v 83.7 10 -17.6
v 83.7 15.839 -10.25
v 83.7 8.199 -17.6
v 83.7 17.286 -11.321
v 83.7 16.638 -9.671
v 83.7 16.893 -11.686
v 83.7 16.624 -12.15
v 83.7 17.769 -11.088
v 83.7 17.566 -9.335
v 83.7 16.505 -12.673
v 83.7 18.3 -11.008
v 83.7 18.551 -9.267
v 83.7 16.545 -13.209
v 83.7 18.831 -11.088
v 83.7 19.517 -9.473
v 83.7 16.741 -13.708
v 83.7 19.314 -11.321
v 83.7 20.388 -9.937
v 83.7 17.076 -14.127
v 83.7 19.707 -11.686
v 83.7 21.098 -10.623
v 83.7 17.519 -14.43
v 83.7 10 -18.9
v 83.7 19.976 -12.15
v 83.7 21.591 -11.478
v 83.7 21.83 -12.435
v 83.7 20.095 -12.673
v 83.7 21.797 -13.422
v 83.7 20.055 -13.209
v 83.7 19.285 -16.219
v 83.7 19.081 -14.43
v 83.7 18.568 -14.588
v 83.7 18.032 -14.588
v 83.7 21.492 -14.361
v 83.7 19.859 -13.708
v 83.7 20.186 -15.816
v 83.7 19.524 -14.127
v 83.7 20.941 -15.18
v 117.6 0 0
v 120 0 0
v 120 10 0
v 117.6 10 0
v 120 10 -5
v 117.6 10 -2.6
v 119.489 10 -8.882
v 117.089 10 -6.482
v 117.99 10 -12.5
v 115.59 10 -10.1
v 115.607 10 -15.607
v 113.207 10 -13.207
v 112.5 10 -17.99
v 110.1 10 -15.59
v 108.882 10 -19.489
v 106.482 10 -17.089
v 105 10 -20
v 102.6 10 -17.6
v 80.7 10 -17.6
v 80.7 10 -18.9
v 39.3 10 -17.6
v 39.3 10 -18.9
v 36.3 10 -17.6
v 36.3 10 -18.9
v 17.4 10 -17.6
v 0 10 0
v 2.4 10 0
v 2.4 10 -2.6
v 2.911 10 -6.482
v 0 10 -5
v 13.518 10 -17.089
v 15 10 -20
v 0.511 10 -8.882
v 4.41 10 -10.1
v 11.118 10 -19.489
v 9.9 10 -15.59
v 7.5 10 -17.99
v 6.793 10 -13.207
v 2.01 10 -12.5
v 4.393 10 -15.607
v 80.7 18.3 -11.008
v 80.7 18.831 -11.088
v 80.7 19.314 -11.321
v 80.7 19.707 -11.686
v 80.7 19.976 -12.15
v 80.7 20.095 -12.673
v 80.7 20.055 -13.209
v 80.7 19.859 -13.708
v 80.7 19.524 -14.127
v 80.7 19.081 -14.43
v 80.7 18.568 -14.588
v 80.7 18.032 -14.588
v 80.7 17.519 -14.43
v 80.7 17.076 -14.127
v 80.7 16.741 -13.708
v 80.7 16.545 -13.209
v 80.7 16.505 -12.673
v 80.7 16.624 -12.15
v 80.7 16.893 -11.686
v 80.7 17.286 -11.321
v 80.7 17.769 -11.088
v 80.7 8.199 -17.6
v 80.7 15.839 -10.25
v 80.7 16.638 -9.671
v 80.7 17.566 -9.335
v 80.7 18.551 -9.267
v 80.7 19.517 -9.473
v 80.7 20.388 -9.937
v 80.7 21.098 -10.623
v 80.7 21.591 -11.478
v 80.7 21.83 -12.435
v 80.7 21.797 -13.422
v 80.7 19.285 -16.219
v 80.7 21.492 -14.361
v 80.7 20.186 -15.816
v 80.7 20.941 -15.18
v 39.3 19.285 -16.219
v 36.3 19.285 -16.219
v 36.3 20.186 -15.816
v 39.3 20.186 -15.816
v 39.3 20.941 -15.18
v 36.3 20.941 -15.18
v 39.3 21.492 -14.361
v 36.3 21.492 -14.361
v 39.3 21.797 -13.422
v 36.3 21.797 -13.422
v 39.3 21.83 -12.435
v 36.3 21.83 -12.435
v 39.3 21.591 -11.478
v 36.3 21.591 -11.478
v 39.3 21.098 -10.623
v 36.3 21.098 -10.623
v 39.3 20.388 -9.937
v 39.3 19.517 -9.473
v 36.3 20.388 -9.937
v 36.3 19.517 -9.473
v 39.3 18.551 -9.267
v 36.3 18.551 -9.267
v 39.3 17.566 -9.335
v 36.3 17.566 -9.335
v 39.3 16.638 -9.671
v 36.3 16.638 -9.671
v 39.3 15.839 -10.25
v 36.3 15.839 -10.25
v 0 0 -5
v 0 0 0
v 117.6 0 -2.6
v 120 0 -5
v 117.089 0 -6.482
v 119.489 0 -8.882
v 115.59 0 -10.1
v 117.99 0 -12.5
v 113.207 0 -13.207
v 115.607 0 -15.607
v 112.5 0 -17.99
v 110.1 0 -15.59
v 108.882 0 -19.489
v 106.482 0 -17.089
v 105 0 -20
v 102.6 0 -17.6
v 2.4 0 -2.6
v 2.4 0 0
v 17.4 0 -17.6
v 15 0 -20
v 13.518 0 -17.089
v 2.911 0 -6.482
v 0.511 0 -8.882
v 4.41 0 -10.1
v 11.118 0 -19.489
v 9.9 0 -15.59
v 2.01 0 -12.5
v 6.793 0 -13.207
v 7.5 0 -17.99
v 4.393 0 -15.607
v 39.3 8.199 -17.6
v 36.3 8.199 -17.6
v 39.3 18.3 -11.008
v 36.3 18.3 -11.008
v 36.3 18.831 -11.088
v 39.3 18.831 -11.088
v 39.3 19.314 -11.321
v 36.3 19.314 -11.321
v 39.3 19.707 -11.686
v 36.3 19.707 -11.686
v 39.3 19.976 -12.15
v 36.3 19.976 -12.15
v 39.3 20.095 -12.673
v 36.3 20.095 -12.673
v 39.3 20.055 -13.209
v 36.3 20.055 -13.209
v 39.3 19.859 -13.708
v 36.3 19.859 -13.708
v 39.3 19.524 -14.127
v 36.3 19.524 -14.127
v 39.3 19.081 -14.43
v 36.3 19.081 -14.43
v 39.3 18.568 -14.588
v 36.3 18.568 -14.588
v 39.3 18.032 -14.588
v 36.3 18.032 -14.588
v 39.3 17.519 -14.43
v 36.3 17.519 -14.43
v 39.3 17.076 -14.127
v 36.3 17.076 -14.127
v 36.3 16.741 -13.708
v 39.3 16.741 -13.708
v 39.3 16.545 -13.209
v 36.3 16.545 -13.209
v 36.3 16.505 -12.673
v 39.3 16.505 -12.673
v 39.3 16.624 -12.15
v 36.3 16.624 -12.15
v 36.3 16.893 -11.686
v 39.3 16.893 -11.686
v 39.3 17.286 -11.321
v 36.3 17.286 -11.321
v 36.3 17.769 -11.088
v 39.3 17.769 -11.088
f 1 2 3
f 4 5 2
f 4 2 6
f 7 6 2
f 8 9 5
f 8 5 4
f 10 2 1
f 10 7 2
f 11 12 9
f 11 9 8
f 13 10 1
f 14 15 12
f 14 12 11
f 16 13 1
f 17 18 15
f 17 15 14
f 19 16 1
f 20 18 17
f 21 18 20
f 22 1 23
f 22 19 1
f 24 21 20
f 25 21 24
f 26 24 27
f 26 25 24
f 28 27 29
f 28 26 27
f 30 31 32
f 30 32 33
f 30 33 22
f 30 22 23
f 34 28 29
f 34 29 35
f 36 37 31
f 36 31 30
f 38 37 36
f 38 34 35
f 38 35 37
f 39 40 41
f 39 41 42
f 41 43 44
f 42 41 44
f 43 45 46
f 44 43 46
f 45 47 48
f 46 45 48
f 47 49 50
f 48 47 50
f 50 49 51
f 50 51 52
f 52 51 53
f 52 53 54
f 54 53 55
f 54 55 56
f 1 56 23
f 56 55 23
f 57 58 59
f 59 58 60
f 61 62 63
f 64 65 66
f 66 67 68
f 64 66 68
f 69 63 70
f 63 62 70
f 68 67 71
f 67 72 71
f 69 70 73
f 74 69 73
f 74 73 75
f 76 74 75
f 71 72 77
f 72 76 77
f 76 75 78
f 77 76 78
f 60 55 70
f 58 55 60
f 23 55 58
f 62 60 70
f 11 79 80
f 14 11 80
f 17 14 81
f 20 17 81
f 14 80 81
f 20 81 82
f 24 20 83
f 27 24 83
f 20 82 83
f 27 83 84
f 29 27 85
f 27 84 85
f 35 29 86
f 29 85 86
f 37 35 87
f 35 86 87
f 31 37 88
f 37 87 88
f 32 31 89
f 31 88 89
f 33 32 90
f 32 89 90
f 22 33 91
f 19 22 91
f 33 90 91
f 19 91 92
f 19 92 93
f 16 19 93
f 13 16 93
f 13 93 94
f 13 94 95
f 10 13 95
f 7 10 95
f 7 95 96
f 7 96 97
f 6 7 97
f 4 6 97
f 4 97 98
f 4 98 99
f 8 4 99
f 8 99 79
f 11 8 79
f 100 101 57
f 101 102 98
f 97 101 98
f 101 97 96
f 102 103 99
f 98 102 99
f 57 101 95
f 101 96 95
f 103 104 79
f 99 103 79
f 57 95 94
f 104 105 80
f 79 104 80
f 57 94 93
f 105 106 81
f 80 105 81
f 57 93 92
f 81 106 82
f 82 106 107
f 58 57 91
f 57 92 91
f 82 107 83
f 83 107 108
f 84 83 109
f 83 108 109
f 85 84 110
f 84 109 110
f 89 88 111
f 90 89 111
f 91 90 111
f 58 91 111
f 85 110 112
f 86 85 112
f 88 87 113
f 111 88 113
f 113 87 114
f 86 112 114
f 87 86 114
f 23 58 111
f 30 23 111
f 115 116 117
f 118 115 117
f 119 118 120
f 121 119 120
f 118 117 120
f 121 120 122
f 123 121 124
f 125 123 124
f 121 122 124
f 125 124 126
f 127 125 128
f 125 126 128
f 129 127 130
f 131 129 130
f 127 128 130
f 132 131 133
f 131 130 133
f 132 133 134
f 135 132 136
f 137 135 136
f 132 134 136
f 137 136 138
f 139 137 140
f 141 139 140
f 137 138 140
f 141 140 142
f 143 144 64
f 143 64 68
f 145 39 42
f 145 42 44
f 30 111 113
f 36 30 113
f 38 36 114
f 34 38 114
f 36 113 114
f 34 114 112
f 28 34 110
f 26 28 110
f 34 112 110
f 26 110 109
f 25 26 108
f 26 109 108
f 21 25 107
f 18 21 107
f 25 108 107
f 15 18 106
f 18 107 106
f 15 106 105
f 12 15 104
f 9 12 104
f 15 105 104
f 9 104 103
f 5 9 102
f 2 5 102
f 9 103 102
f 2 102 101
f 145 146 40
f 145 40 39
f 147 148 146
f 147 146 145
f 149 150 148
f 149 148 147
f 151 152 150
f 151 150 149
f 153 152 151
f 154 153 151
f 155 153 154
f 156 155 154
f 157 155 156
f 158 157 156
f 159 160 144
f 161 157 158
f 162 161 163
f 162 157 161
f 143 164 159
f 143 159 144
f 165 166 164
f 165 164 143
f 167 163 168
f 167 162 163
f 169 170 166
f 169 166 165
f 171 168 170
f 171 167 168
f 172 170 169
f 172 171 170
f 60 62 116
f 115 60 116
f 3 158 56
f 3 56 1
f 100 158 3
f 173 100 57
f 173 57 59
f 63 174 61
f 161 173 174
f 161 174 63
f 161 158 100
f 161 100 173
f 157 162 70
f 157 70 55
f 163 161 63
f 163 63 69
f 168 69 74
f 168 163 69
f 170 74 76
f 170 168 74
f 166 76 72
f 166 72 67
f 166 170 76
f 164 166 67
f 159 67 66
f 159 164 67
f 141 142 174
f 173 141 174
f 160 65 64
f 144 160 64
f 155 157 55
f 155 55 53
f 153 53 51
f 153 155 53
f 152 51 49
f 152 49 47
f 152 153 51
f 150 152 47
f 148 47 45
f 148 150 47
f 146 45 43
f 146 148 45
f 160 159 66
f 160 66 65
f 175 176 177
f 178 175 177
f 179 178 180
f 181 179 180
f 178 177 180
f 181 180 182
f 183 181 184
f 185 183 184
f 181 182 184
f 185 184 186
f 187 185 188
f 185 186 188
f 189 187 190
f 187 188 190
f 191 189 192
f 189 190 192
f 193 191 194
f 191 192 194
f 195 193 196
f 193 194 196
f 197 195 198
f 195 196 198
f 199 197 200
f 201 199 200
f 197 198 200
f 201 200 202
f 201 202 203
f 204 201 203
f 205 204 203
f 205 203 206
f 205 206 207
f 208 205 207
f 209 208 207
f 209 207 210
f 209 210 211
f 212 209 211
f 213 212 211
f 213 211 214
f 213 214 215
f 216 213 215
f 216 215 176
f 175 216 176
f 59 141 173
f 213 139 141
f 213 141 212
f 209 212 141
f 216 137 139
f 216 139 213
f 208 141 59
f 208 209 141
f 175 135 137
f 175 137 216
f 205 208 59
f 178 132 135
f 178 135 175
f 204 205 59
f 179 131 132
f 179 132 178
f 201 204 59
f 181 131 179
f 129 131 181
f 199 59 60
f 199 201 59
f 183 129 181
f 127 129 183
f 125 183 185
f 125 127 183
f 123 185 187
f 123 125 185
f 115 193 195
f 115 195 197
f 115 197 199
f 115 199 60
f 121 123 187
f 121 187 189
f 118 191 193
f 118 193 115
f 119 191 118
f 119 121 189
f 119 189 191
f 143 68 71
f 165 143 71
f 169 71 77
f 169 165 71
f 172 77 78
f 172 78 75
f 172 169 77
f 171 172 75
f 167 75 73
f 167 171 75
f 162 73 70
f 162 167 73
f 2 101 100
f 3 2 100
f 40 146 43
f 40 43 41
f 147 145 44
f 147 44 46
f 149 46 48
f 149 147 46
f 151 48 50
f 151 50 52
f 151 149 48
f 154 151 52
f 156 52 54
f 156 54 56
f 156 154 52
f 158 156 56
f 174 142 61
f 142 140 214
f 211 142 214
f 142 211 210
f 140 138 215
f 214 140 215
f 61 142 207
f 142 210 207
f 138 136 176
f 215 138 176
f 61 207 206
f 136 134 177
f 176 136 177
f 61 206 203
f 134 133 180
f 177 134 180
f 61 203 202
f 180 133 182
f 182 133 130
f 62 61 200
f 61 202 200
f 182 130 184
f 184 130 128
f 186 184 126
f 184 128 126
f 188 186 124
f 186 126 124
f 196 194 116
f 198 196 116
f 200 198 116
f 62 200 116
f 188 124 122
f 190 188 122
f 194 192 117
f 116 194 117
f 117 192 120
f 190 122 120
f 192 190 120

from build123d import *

# Parameters (mm, degrees)
BOSS_EXTRUDE1_DEPTH  = 10
SKETCH2_R            = 3.55
SKETCH2_R_2          = 1.75
BOSS_EXTRUDE2_DEPTH  = 3
BOSS_EXTRUDE3_START  = -44.4
SKETCH2_3_R          = 3.55
SKETCH2_3_R_2        = 1.75
BOSS_EXTRUDE3_DEPTH  = 3
M3_CLEARANCE_HOLE1_D = 3.6


with BuildPart() as part:
    # Sketch1 → Boss-Extrude1 (new body)
    with BuildSketch(Plane(origin=(0, 0, 0), x_dir=(1, 0, 0), z_dir=(0, 1, 0))):
        with BuildLine():
            Line((0, 0), (0, 5))
            ThreePointArc((0, 5), (4.393398282, 15.606601718), (15, 20))
            Line((15, 20), (105, 20))
            ThreePointArc((105, 20), (115.606601718, 15.606601718), (120, 5))
            Line((120, 5), (120, 0))
            Line((120, 0), (117.6, 0))
            Line((117.6, 0), (117.6, 2.6))
            ThreePointArc((117.6, 2.6), (113.206601718, 13.206601718), (102.6, 17.6))
            Line((102.6, 17.6), (17.4, 17.6))
            ThreePointArc((17.4, 17.6), (6.793398282, 13.206601718), (2.4, 2.6))
            Line((2.4, 2.6), (2.4, 0))
            Line((2.4, 0), (0, 0))
        make_face()
    extrude(amount=BOSS_EXTRUDE1_DEPTH)

    # Sketch2 → Boss-Extrude2 (add)
    # profile 1 of 3: a face of its own
    with BuildSketch(Plane(origin=(80.7, 0, 0), x_dir=(0, 0, -1), z_dir=(1, 0, 0))):
        with BuildLine():
            Line((17.6, 10), (18.9, 10))
            Line((18.9, 10), (16.218619991, 19.284947678))
            ThreePointArc((16.218619991, 19.284947678), (16.32297688, 18.797379809), (16.357992766, 18.3))
            ThreePointArc((16.357992766, 18.3), (14.134741273, 15.007244558), (10.249689442, 15.838784019))
            Line((10.249689442, 15.838784019), (17.6, 8.19852649))
            Line((17.6, 8.19852649), (17.6, 10))
        make_face()
    # profile 2 of 3: a face of its own
    with BuildSketch(Plane(origin=(80.7, 0, 0), x_dir=(0, 0, -1), z_dir=(1, 0, 0))):
        with Locations((12.807992766, 18.3)):
            Circle(SKETCH2_R)
        with Locations((12.807992766, 18.3)):
            Circle(SKETCH2_R_2, mode=Mode.SUBTRACT)
    # profile 3 of 3: a face of its own
    with BuildSketch(Plane(origin=(80.7, 0, 0), x_dir=(0, 0, -1), z_dir=(1, 0, 0))):
        with Locations((12.807992766, 18.3)):
            Circle(SKETCH2_R_2)
    extrude(amount=BOSS_EXTRUDE2_DEPTH)

    # Sketch2<3> → Boss-Extrude3 (add)
    with BuildSketch(Plane(origin=(80.7, 0, 0), x_dir=(0, 0, -1), z_dir=(1, 0, 0)).offset(BOSS_EXTRUDE3_START)):
        with BuildLine():
            Line((17.6, 10), (18.9, 10))
            Line((18.9, 10), (16.218619991, 19.284947678))
            ThreePointArc((16.218619991, 19.284947678), (16.32297688, 18.797379809), (16.357992766, 18.3))
            ThreePointArc((16.357992766, 18.3), (14.134741273, 15.007244558), (10.249689442, 15.838784019))
            Line((10.249689442, 15.838784019), (17.6, 8.19852649))
            Line((17.6, 8.19852649), (17.6, 10))
        make_face()
        with Locations((12.807992766, 18.3)):
            Circle(SKETCH2_3_R)
        with Locations((12.807992766, 18.3)):
            Circle(SKETCH2_3_R_2)
    extrude(amount=BOSS_EXTRUDE3_DEPTH)

    # M3 Clearance Hole1 (through all)
    with Locations(Plane(origin=(83.7, 0, 0), x_dir=(0, 0, -1), z_dir=(1, 0, 0))):
        with Locations((12.807992766, 18.3)):
            Hole(M3_CLEARANCE_HOLE1_D / 2)


solid = part.part
